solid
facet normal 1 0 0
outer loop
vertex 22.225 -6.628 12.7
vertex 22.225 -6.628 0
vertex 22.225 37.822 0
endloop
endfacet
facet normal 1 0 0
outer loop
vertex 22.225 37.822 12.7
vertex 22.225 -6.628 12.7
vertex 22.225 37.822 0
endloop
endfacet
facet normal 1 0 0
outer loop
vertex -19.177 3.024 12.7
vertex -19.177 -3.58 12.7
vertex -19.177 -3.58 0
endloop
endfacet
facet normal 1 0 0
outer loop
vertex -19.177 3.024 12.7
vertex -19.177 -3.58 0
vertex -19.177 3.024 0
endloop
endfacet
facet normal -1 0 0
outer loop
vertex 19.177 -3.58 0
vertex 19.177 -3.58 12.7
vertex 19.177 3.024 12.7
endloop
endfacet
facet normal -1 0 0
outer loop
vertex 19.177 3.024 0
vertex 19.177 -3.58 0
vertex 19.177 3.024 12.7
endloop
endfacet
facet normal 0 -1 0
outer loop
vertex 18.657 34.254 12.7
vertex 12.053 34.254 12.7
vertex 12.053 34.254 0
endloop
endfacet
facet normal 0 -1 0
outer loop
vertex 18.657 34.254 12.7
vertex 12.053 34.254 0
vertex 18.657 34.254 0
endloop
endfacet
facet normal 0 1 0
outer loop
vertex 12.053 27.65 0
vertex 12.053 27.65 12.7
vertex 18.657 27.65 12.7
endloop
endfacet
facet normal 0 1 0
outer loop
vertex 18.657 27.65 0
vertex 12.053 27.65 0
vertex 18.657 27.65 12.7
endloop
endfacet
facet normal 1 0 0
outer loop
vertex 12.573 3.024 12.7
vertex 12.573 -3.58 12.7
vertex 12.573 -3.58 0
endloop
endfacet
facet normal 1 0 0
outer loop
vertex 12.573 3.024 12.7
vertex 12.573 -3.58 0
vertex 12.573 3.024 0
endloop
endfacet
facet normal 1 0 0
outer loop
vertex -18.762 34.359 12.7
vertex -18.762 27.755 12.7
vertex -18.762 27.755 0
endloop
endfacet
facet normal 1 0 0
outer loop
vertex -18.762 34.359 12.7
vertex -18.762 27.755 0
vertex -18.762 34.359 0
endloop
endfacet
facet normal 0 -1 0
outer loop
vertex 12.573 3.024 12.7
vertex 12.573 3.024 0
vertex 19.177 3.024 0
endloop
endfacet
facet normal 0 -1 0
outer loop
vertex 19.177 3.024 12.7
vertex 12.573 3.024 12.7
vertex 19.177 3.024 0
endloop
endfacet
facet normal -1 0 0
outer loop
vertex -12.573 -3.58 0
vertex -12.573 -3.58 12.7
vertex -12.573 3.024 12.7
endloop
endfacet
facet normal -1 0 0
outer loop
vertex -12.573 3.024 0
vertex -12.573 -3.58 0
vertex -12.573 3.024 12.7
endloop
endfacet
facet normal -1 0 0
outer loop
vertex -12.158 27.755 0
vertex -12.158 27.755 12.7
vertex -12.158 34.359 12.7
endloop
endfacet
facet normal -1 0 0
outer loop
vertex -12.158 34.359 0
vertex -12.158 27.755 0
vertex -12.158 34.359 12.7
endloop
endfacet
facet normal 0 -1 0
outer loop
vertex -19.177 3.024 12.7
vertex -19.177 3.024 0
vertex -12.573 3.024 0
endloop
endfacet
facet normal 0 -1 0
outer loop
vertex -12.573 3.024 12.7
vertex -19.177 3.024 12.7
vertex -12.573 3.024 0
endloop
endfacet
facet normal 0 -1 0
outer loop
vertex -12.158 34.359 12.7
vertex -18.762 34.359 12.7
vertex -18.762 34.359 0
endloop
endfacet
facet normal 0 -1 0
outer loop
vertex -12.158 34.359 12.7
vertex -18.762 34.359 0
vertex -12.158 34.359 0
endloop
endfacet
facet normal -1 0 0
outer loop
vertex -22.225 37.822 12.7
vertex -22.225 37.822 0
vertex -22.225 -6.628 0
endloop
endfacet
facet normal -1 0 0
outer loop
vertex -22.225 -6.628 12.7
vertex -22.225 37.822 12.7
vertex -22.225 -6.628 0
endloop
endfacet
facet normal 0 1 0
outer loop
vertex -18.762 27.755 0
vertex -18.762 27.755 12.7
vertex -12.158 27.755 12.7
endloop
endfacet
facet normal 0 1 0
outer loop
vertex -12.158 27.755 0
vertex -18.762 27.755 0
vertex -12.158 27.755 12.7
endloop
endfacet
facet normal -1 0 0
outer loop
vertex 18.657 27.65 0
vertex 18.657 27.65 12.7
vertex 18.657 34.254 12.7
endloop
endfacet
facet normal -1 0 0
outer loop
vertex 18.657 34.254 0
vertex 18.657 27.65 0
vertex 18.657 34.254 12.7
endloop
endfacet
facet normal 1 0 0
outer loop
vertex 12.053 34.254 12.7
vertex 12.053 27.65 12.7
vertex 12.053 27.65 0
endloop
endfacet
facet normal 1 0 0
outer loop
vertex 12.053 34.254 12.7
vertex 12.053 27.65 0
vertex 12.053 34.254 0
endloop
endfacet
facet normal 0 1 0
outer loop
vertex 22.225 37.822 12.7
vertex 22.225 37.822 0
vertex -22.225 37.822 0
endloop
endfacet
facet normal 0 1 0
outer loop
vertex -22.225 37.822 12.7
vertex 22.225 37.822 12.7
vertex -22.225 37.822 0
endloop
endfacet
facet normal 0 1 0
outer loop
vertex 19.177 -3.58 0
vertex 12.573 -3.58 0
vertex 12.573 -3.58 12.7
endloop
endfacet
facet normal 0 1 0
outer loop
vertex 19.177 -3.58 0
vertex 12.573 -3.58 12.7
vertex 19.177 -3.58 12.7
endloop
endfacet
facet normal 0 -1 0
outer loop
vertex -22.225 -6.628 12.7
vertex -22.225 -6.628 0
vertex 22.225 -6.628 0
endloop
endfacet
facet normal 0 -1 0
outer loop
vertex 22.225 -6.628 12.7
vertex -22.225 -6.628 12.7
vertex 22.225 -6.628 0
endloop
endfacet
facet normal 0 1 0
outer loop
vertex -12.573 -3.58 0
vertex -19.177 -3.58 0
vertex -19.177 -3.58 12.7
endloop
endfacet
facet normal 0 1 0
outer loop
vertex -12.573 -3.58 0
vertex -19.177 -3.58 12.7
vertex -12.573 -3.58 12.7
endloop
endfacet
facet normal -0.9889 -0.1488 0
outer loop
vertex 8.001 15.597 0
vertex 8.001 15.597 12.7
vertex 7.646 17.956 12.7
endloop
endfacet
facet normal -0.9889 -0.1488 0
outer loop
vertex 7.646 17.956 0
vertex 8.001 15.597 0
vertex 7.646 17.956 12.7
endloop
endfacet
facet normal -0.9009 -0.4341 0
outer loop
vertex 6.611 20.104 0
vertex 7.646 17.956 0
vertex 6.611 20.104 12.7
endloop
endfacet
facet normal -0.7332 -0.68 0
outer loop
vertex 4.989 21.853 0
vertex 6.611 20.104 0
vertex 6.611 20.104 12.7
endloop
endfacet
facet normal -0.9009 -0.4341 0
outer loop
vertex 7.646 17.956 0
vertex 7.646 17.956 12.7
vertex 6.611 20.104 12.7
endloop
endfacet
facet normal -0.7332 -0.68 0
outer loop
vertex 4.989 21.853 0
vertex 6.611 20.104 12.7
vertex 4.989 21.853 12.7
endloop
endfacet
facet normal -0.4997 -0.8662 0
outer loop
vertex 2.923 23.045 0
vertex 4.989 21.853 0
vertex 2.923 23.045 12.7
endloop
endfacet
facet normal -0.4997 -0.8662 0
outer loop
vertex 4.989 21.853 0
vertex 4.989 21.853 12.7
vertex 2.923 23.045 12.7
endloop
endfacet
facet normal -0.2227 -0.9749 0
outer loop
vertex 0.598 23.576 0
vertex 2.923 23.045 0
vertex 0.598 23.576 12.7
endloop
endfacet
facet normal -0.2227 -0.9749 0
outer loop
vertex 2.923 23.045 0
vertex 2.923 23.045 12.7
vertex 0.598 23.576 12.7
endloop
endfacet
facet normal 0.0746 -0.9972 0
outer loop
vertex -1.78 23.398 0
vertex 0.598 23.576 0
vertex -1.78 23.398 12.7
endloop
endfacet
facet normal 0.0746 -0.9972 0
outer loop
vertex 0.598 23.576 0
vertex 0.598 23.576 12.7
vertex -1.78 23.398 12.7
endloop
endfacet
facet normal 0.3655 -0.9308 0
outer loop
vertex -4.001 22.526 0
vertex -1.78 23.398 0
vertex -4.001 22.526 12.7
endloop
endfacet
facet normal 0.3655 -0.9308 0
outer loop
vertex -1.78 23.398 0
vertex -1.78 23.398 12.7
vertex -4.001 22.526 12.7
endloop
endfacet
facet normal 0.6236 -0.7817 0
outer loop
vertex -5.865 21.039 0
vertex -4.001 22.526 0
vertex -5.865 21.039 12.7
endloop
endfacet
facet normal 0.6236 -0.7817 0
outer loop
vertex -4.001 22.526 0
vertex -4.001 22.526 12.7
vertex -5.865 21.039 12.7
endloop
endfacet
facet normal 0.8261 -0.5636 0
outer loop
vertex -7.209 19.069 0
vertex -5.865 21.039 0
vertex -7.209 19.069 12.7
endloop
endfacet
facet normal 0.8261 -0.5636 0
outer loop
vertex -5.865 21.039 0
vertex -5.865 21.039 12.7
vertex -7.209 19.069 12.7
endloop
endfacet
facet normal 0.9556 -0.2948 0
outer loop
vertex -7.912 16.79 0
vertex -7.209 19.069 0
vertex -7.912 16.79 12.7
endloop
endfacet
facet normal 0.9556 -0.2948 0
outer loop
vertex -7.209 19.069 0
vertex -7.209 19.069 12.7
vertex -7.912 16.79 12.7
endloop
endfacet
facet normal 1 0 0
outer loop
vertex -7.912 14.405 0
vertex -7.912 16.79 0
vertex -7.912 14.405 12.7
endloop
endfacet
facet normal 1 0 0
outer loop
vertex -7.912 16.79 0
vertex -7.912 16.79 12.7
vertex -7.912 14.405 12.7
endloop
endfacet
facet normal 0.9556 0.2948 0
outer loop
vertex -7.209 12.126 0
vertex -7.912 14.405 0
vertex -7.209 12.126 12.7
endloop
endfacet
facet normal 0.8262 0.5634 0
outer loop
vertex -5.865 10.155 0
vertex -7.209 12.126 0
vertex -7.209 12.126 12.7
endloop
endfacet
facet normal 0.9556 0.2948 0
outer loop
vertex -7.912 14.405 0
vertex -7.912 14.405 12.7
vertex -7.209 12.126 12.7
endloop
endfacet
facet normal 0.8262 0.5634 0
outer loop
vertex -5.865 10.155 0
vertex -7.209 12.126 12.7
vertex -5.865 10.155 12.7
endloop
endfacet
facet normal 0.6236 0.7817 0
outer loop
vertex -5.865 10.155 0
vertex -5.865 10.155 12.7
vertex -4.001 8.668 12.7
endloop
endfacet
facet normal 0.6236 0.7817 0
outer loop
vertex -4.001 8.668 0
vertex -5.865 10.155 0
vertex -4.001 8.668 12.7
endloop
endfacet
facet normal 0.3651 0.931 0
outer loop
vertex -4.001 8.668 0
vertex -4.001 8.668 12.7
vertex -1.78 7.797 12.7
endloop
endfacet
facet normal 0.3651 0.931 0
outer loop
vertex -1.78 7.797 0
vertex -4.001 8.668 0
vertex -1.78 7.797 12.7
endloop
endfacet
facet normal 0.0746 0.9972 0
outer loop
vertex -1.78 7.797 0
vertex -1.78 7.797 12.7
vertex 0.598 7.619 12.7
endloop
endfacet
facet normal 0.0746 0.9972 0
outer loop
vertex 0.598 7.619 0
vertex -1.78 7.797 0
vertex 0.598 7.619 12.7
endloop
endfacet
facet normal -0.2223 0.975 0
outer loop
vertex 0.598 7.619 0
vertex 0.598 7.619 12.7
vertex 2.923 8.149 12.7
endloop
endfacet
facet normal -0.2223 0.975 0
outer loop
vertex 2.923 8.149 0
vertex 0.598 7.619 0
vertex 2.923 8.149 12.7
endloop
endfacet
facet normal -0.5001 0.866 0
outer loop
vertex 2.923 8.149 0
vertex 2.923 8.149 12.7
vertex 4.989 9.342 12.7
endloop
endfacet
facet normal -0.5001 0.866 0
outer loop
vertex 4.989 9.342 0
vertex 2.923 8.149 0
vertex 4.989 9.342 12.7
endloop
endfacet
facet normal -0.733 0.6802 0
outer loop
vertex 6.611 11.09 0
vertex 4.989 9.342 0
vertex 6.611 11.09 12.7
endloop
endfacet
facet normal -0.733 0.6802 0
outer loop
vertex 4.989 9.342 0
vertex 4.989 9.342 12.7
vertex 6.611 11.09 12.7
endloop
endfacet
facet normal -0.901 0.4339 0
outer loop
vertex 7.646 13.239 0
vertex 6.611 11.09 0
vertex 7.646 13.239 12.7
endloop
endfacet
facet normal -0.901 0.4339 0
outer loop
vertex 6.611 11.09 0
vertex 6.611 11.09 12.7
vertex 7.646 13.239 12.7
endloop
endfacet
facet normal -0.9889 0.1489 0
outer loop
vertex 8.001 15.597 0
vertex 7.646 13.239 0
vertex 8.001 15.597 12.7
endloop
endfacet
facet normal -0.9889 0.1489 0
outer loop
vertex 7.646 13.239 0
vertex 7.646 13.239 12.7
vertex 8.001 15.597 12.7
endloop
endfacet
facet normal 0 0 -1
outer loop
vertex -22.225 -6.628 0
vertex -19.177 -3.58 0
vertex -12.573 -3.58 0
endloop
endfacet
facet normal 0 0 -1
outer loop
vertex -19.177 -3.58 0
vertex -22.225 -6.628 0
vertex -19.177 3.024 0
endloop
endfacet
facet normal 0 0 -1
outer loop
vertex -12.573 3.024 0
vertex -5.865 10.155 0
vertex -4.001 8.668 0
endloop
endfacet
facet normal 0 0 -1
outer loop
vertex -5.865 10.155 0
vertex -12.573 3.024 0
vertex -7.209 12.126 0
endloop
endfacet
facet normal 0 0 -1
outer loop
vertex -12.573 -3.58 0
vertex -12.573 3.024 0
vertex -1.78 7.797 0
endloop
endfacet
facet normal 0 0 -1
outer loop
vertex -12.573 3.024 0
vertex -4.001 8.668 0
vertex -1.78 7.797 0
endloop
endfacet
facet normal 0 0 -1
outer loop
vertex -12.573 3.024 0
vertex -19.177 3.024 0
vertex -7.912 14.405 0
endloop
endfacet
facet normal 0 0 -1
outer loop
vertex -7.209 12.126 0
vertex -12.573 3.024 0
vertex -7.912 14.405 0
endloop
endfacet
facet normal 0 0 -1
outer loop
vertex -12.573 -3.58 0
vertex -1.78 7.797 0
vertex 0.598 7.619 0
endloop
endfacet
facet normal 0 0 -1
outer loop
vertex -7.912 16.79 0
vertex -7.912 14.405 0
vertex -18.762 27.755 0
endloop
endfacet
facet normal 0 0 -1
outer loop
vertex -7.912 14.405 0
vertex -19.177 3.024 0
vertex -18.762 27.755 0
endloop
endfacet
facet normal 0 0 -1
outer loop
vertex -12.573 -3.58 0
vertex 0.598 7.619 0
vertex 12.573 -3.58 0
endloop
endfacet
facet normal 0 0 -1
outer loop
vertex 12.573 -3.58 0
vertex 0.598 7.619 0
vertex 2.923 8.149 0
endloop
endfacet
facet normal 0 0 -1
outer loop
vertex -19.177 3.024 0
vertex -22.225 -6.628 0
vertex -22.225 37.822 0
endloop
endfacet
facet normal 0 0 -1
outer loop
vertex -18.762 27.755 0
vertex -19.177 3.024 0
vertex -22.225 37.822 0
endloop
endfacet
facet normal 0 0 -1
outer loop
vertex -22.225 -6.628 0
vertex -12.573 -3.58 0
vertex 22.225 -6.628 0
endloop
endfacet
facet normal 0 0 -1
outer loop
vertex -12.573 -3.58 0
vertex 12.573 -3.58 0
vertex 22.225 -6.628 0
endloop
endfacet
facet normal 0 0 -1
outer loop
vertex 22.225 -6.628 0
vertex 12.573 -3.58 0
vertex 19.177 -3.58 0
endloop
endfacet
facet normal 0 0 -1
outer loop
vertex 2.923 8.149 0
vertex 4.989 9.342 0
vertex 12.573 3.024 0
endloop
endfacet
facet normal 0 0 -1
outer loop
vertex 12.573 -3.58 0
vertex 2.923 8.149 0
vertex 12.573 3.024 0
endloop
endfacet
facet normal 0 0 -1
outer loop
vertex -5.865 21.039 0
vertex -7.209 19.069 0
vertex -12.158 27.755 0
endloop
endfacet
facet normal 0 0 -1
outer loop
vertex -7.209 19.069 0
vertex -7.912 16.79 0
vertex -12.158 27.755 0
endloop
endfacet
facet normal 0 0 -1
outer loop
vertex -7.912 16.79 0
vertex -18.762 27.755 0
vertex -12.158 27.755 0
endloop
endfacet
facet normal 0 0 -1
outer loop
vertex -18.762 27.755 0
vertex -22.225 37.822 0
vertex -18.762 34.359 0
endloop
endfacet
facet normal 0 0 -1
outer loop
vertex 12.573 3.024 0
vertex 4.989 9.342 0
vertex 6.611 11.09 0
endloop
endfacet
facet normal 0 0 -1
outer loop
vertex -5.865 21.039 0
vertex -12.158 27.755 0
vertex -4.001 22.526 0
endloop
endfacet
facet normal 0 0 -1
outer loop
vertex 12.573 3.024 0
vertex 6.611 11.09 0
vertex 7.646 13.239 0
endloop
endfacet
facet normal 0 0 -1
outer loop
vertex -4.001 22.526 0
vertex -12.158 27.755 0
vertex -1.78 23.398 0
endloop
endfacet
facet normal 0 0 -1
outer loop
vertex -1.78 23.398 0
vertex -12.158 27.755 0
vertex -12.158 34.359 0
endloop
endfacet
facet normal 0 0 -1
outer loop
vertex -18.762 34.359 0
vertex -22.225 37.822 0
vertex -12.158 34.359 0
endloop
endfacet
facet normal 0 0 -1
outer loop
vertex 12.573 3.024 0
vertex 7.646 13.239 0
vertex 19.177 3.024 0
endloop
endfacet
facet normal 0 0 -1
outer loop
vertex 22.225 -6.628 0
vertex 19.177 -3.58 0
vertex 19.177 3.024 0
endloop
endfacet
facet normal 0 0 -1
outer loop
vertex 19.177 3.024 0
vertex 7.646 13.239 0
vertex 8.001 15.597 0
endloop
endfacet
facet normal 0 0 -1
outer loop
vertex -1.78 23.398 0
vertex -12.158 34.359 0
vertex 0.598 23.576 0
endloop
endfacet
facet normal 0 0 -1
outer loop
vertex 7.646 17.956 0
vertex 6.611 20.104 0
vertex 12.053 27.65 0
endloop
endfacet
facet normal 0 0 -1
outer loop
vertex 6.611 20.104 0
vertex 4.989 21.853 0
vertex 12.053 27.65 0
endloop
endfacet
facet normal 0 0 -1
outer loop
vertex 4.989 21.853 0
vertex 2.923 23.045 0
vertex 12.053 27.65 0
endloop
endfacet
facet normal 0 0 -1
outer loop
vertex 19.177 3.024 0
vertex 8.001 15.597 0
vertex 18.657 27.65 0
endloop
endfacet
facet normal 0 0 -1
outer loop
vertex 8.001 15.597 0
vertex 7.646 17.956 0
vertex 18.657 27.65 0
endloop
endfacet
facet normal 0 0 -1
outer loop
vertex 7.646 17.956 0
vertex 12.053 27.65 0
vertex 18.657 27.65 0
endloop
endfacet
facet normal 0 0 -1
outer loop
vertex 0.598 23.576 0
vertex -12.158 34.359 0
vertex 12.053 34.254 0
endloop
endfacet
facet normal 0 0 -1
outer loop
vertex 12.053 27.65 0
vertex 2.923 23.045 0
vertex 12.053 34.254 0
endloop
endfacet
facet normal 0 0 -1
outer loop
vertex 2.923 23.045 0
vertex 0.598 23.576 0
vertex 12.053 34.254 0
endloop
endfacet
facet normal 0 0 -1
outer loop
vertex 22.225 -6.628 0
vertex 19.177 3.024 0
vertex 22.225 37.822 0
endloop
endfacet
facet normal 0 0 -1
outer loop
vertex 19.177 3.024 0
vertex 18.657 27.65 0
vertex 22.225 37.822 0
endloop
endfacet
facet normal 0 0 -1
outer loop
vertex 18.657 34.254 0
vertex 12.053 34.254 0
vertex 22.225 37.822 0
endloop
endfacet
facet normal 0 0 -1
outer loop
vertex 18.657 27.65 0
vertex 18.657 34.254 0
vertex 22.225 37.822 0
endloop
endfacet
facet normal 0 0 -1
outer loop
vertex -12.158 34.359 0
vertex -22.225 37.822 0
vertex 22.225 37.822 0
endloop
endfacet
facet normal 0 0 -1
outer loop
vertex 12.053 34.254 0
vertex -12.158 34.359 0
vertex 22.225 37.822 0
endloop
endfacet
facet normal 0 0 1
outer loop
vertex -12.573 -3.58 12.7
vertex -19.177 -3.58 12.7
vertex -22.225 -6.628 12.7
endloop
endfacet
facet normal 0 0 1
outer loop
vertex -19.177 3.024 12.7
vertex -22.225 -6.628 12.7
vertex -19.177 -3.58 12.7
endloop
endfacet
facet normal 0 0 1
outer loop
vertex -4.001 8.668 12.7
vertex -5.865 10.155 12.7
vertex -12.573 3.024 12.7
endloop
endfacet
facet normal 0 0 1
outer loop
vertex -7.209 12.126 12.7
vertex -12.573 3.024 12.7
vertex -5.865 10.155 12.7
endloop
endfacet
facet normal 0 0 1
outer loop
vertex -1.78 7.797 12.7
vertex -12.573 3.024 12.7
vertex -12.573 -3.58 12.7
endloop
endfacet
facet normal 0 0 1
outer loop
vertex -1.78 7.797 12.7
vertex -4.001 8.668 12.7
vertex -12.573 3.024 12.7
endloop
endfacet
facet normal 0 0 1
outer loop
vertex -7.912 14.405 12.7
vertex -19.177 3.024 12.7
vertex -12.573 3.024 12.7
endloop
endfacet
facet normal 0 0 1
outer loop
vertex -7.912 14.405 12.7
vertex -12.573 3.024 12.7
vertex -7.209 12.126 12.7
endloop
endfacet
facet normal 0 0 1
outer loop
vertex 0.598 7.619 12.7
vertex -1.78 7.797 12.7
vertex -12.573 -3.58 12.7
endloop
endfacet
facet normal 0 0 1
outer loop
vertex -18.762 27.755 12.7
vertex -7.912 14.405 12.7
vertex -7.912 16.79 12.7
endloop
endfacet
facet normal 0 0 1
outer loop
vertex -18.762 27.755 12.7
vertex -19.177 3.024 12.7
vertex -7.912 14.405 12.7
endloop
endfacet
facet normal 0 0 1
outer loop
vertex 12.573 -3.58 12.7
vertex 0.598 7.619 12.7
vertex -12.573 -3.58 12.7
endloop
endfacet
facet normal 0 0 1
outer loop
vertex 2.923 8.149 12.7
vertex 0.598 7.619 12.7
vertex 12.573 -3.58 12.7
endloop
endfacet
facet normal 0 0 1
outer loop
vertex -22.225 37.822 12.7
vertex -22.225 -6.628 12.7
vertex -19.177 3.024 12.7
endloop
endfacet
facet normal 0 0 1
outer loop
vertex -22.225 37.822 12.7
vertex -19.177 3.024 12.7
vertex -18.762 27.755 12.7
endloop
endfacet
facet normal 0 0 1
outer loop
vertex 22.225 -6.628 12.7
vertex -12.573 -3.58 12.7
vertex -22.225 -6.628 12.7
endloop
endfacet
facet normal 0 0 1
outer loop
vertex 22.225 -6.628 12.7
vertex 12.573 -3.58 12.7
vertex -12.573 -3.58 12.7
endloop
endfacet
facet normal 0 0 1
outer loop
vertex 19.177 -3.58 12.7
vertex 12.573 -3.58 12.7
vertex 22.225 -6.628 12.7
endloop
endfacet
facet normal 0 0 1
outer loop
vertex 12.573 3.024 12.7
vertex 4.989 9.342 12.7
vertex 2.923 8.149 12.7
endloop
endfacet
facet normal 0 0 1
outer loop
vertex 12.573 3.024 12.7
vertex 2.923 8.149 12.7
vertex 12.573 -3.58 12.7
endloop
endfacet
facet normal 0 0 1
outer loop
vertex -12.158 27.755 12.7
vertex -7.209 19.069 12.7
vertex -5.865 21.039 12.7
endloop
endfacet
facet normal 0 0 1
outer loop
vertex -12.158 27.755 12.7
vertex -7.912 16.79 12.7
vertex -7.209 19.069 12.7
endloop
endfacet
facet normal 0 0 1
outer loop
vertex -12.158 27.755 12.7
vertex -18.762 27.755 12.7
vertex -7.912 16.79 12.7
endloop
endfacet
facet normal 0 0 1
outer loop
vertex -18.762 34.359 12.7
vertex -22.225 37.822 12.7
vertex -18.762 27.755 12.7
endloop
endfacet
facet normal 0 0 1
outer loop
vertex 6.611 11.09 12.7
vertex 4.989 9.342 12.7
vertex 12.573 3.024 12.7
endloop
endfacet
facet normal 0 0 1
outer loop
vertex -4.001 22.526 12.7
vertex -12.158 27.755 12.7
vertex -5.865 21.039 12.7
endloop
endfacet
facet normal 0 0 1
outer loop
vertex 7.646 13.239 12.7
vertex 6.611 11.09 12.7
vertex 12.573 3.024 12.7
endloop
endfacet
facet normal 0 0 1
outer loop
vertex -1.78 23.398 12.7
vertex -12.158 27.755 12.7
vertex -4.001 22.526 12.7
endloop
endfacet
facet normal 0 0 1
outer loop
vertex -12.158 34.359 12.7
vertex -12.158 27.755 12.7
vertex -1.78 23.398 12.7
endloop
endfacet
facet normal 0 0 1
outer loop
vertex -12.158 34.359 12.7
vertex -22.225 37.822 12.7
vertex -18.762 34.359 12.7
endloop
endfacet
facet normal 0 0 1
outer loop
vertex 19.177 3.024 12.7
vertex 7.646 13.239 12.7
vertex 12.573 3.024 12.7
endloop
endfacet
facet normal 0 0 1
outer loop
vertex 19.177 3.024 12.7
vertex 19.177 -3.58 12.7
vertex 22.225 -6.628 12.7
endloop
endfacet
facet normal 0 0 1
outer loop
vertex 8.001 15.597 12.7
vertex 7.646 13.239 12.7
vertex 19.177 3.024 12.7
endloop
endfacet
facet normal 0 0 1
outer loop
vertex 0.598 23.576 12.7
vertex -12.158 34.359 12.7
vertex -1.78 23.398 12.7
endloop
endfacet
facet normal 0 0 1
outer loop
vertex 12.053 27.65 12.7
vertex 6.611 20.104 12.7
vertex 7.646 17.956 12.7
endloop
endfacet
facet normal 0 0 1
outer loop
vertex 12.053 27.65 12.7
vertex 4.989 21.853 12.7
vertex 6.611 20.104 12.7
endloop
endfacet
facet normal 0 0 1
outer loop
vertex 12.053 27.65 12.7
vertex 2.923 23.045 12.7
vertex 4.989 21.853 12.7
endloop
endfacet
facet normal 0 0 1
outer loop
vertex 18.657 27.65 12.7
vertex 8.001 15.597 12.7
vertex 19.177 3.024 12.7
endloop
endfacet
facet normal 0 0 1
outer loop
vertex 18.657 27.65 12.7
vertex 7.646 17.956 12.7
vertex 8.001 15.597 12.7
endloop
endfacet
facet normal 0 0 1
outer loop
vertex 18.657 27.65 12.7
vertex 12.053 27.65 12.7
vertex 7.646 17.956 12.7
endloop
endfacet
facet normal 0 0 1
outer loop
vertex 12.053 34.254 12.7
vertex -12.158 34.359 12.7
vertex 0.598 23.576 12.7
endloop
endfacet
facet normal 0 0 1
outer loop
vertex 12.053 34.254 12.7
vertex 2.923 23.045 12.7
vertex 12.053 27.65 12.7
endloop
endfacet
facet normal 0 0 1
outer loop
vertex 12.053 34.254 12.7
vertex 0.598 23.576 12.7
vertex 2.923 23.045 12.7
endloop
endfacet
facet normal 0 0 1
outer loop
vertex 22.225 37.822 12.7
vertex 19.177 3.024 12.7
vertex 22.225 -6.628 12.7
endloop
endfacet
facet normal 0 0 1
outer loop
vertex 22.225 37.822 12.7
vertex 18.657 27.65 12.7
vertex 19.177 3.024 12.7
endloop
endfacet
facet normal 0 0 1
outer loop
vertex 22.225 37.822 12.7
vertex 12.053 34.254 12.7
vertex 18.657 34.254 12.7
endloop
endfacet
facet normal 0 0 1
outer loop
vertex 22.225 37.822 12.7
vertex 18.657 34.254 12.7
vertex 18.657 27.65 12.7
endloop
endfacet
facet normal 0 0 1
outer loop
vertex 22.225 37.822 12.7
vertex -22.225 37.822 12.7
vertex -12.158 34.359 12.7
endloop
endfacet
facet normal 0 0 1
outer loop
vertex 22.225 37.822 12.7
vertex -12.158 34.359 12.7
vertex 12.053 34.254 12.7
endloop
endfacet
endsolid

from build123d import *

# Parameters (mm, degrees)
F1_DEPTH = 12.7
F2_R     = 8.001
F2_W     = 6.604
F2_H     = 6.604
F3_DEPTH = 12.7


with BuildPart() as f1:
    # F0 (on Top) → F1 (new body)
    with BuildSketch(Plane.XY):
        Polygon((22.225, 37.822188), (-22.225, 37.822188), (-22.225, -6.627812), (-5.278436, -6.627812), (12.779376, -6.627812), (22.225, -6.627812), align=None)
    extrude(amount=F1_DEPTH)

    # F2 (on face) → F3 (cut)
    with BuildSketch(Plane.XY.offset(12.7)):
        with Locations((0, 15.597188)):
            Circle(F2_R)
        with Locations((-15.459939, 31.057127)):
            Rectangle(F2_W, F2_H)
        with Locations((15.355254, 30.952442)):
            Rectangle(F2_W, F2_H)
        with Locations((15.875, -0.277812)):
            Rectangle(F2_W, F2_H)
        with Locations((-15.875, -0.277812)):
            Rectangle(F2_W, F2_H)
    extrude(amount=-F3_DEPTH, mode=Mode.SUBTRACT)


solid = f1.part
